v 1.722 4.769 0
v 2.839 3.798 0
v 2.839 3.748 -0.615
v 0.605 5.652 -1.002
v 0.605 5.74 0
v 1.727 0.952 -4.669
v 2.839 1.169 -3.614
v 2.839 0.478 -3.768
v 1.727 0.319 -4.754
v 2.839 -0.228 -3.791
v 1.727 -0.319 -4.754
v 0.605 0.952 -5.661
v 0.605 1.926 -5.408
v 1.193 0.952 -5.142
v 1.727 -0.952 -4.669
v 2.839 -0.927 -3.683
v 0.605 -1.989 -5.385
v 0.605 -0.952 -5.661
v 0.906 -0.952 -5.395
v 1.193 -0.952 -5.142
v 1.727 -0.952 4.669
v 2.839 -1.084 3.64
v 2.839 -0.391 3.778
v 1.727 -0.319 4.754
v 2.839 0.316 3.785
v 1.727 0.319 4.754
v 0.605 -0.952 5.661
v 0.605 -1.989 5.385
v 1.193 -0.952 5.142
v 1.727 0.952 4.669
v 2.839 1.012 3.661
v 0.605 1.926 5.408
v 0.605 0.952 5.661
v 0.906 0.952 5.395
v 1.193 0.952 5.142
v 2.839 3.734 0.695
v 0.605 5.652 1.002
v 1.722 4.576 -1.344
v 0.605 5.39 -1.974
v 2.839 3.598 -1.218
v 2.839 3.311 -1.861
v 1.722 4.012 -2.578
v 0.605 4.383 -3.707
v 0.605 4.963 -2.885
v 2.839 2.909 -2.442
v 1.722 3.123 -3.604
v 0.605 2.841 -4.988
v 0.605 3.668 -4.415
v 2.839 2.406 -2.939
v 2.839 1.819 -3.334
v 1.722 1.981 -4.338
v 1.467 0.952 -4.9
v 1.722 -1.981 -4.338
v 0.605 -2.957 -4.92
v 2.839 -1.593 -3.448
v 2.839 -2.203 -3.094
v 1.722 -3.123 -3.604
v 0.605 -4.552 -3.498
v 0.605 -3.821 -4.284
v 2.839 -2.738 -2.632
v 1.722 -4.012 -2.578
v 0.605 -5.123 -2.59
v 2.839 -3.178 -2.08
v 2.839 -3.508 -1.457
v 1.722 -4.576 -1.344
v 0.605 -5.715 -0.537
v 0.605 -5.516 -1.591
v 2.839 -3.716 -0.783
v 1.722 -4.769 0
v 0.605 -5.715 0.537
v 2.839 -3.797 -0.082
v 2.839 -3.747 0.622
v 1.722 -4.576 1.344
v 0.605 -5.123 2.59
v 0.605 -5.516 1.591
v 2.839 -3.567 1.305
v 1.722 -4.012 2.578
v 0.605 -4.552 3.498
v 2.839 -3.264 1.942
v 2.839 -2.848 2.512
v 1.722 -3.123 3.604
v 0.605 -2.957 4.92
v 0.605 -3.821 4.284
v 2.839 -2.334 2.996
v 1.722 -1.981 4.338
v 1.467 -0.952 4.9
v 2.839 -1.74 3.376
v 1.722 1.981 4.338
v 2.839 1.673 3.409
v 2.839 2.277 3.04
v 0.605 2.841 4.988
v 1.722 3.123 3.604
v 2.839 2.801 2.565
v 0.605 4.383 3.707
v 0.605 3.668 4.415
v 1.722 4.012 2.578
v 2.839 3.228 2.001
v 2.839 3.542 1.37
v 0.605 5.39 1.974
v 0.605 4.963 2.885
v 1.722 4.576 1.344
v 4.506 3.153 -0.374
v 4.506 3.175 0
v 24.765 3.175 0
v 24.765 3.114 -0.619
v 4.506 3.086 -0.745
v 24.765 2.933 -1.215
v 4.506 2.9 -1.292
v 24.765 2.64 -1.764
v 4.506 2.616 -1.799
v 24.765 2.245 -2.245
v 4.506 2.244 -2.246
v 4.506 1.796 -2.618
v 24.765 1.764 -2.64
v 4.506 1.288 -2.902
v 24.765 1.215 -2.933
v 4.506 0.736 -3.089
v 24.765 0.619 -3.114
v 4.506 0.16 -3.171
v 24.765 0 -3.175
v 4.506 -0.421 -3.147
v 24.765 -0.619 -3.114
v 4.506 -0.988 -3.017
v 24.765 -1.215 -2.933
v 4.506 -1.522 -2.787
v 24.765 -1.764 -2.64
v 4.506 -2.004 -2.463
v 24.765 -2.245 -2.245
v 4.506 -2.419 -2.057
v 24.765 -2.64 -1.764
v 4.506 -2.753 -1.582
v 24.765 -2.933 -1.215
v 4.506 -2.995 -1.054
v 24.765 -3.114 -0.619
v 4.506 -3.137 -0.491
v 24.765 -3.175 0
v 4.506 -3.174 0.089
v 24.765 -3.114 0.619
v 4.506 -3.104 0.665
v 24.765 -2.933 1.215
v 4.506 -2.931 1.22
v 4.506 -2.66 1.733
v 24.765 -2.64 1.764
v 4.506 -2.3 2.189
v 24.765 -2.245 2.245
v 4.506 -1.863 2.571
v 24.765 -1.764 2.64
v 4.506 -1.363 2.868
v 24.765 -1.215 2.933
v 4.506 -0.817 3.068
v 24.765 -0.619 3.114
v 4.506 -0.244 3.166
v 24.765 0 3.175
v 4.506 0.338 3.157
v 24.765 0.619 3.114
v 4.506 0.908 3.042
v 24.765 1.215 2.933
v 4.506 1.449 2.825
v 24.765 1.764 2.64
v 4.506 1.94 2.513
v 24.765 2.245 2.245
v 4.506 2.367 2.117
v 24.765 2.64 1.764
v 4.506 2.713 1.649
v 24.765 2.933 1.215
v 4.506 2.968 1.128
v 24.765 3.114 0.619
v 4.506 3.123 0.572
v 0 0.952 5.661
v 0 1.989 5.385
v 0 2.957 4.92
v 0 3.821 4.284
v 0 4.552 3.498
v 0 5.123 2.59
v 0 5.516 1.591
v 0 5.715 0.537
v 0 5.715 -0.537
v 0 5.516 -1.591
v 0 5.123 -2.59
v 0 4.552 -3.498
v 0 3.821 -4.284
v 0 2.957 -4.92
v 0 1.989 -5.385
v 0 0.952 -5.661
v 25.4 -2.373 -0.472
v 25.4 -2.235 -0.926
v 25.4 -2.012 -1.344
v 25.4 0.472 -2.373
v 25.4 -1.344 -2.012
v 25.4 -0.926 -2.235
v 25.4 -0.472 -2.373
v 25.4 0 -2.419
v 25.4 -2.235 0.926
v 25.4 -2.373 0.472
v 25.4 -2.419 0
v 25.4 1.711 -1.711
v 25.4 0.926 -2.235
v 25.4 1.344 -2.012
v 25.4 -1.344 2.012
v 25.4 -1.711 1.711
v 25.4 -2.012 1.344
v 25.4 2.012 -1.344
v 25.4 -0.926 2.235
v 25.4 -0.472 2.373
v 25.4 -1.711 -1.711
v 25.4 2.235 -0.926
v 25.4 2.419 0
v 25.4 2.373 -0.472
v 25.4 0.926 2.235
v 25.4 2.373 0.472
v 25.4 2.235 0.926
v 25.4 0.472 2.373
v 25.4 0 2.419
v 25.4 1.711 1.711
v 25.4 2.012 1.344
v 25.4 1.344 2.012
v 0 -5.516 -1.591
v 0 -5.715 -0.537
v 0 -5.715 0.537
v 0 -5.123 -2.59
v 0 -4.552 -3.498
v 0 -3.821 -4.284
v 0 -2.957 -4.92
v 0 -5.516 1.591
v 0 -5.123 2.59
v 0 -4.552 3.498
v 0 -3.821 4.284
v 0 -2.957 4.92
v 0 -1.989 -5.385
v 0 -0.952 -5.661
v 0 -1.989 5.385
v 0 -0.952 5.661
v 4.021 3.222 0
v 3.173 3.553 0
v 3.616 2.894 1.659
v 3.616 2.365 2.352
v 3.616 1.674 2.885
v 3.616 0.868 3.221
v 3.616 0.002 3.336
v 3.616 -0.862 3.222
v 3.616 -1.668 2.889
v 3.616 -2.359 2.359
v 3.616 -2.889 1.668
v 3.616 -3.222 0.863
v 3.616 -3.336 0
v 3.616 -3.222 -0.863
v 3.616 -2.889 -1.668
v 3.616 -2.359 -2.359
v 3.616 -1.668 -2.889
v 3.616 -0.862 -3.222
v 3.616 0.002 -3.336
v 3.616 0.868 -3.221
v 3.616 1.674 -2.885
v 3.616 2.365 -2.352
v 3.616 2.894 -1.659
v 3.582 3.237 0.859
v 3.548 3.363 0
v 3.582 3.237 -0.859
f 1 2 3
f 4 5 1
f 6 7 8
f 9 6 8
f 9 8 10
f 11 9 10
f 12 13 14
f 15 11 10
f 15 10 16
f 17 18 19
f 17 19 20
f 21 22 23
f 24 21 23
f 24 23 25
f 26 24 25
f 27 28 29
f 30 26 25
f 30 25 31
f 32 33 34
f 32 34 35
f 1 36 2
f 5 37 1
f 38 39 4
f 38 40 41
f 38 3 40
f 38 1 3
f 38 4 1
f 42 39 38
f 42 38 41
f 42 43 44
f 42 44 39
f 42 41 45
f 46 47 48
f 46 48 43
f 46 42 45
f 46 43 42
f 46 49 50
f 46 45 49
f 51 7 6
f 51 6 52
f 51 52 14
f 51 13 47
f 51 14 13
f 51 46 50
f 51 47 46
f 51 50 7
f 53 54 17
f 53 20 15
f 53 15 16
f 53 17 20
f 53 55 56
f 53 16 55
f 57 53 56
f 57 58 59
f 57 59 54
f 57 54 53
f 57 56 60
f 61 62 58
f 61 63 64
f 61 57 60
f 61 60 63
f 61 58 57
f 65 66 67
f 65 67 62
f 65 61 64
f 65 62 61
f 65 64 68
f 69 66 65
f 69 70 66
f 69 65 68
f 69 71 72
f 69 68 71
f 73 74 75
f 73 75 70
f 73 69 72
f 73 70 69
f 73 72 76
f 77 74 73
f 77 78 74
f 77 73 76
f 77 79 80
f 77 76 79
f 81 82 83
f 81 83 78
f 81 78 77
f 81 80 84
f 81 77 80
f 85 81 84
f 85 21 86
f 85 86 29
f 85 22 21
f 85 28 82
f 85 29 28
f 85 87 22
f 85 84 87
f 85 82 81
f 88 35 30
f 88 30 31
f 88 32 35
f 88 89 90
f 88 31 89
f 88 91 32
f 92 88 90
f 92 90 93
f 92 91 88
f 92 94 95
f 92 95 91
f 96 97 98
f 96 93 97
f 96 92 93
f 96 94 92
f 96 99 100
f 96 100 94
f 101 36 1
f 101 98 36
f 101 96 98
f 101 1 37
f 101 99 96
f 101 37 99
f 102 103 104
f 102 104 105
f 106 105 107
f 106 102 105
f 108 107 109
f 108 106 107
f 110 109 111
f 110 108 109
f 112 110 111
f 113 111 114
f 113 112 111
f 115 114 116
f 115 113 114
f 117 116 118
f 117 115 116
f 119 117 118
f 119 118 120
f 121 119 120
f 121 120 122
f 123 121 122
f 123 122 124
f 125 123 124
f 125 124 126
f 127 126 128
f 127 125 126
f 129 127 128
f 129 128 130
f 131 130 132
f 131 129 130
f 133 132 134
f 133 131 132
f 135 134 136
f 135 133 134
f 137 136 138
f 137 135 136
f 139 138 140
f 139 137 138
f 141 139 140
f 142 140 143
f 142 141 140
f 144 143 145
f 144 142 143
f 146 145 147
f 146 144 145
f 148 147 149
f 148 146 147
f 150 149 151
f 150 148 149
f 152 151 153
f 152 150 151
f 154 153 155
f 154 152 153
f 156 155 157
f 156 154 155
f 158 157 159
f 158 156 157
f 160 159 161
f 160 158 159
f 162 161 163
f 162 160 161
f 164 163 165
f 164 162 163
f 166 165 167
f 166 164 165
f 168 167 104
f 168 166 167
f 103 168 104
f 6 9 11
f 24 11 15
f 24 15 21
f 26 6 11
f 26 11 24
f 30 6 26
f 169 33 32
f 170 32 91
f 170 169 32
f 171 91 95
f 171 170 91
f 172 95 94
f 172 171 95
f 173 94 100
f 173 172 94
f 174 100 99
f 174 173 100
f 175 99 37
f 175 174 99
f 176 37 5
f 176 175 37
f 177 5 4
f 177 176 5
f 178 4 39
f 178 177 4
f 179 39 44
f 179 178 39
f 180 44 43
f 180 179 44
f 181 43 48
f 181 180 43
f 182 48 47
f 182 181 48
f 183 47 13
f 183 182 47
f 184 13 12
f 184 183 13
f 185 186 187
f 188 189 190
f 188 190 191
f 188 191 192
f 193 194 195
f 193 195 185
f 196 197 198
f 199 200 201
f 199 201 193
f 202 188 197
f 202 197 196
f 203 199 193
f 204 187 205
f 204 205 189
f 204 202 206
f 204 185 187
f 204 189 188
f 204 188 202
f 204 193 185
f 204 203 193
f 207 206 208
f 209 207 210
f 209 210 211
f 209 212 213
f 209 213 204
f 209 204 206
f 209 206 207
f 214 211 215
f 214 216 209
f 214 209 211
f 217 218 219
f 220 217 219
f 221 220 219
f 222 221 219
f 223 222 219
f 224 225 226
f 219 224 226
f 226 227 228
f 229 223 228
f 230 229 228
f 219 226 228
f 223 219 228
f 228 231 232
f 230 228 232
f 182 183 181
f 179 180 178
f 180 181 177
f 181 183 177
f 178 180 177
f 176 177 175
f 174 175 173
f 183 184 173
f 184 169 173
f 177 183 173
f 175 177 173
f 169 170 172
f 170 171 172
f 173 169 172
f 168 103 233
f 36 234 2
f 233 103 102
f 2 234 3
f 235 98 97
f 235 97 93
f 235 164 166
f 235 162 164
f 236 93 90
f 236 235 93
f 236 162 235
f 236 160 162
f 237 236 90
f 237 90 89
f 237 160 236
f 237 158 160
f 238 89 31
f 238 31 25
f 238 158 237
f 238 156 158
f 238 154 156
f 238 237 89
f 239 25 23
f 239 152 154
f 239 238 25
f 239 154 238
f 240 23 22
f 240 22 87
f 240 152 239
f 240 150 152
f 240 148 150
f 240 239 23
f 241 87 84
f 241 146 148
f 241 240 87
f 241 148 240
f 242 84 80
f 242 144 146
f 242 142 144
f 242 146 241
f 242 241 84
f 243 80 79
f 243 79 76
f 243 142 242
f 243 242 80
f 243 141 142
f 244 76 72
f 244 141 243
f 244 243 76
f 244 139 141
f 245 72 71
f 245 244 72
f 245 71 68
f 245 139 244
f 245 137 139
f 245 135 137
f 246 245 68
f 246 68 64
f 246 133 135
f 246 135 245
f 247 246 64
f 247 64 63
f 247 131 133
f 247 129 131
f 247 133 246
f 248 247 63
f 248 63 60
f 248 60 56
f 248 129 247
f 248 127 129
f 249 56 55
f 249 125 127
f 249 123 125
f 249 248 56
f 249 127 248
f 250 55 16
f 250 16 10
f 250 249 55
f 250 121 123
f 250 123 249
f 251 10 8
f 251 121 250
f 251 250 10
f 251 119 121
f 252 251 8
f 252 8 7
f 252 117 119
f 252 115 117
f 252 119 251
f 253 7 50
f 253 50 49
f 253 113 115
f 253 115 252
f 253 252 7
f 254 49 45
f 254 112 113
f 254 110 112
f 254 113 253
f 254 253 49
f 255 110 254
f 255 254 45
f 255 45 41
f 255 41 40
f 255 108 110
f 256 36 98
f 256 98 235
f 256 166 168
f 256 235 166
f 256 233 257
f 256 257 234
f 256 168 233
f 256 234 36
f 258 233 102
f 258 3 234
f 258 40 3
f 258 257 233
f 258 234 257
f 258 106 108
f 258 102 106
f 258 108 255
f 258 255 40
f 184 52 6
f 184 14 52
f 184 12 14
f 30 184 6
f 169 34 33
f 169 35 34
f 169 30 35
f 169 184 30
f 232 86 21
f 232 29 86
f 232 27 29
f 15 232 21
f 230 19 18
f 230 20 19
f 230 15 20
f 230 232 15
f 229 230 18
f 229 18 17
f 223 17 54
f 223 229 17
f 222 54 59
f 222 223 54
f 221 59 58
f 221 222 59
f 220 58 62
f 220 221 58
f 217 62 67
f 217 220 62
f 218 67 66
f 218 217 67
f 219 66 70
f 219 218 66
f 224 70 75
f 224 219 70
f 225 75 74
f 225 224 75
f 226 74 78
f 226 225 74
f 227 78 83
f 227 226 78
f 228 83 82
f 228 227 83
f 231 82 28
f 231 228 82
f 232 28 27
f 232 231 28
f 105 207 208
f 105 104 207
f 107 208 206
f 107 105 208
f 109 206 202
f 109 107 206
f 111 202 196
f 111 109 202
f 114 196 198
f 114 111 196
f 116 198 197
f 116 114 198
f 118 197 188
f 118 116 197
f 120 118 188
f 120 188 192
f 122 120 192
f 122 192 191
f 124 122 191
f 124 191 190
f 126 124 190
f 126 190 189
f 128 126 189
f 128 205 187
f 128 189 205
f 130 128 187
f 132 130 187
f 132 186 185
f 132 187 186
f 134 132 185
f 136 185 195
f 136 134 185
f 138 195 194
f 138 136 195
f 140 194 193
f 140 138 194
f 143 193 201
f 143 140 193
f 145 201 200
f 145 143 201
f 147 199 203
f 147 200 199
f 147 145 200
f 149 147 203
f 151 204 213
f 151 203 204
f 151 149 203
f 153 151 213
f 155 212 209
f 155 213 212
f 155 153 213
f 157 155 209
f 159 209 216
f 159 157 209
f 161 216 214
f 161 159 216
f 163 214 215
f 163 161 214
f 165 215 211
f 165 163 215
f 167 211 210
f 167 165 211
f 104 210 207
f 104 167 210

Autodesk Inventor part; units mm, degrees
ref_plane "YZ Plane" through (0, 0, 0) normal (1, 0, 0) x (0, 1, 0)
ref_plane "XZ Plane" through (0, 0, 0) normal (0, 1, 0) x (-1, 0, 0)
sketch "Sketch1" plane through (0, 0, 0) normal (0, 0, 1) x (1, 0, 0)
  line L0 (0, 0) -> (25.4, 0)
  line L1 (25.4, 0) -> (25.4, 3.175)
  line L2 (25.4, 3.175) -> (6.731, 3.175)
  line L3 (6.731, 3.175) -> (5.461, 3.175)
  line L4 (5.461, 3.175) -> (3.556, 3.175)
  line L5 (3.556, 3.175) -> (0.6048, 5.7404)
  line L6 (0.6048, 5.7404) -> (0, 5.7404)
  line L7 (0, 5.7404) -> (0, 0)
  line L8 (6.731, 3.175) -> (3.556, 3.175) construction
  line L9 (-5.08, 0) -> (30.48, 0) projected
  line L10 (0, 6.8885) -> (0, -1.1481) projected
  dimension "d0" = 25.4
  dimension "d1" = 41
  dimension "d2" = 1.27
  dimension "d3" = 18.669
  dimension "d4" = 3.556
  dimension "d5" = 6.35
  dimension "d6" = 6.35
  dimension "d7" = 11.4808
revolve "Body" add sketch "Sketch1" angle 360 about axis through (0, 0, 0) along (1, 0, 0)
sketch "Sketch2" plane through (0, 0, 0) normal (-1, 0, 0) x (0, 0, 1)
  line L0 (5.7404, -0.9525) -> (-5.7404, -0.9525)
  line L1 (-5.7404, -0.9525) -> (-5.7404, 0.9525)
  line L2 (-5.7404, 0.9525) -> (5.7404, 0.9525)
  line L3 (5.7404, 0.9525) -> (5.7404, -0.9525)
  line L4 (0, 0.9525) -> (0, -0.9525) construction
  line L5 (-5.7404, 0) -> (5.7404, 0) construction
  line L6 (0, 5.7404) -> (0, 0) projected
  dimension "d15" = 1.905
  dimension "d16" = 11.4808
extrude "Slot" cut sketch "Sketch2" against normal blind 1.7272
thread "Thread" size "1/4-20 UNC" class "2A" standard "ANSI Unified Screw Threads" length 18.669
chamfer "Chamfer1" distance 0.7556 distance2 0.635 1 edges at (25.4, -3.175, 0) measured on face at (25.4, 0.7614, 0.4485)
fillet "Radius" radius 2.54 1 edges at (3.556, -3.175, 0)
ref_plane "Work Plane1" through (33.575, 0, 0) normal (0, 0, -1) x (1, 0, 0)
equation "\"d0\" = NLG"
equation "\"d1\" = 0.5 * SEWI"
equation "\"d2\" = GAL"
equation "\"d3\" = GEL"
equation "\"d4\" = KOH"
equation "\"d5\" = BDM"
equation "\"d6\" = GD"
equation "\"d7\" = KOD"
equation "\"d15\" = SBR"
equation "\"d16\" = KOD"
equation "\"d8\" = STI"
equation "\"d41\" = RR"
equation "\"d10\" = GEL"
equation "\"d12\" = -0.5 * SPD + 0.5 * GD"
equation "\"d13\" = 0.5 * GAL"
equation "\"NLG\" = 25.4"
equation "\"GAL\" = 1.27"
equation "\"GEL\" = 18.669"
equation "\"KOH\" = 3.556"
equation "\"KOD\" = 11.4808"
equation "\"SEWI\" = 82deg"
equation "\"BDM\" = NND"
equation "\"GD\" = NND"
equation "\"SBR\" = 1.905"
equation "\"STI\" = 1.7272"
equation "\"SPD\" = 4.8387"
equation "\"RR\" = 2.54"
equation "\"GUL\" = 0.75565"
equation "\"TOA\" = 30deg"
equation "\"THREADDIA\" = 6.35"
equation "\"HHPTC\" = 1.27"
equation "\"NND\" = 6.35"
equation "\"GD1\" = SPD"
properties part number "ANSI B18.6.2 - 1/4-20 UNC x 1, SFCHCSI" material "Steel, Mild"
